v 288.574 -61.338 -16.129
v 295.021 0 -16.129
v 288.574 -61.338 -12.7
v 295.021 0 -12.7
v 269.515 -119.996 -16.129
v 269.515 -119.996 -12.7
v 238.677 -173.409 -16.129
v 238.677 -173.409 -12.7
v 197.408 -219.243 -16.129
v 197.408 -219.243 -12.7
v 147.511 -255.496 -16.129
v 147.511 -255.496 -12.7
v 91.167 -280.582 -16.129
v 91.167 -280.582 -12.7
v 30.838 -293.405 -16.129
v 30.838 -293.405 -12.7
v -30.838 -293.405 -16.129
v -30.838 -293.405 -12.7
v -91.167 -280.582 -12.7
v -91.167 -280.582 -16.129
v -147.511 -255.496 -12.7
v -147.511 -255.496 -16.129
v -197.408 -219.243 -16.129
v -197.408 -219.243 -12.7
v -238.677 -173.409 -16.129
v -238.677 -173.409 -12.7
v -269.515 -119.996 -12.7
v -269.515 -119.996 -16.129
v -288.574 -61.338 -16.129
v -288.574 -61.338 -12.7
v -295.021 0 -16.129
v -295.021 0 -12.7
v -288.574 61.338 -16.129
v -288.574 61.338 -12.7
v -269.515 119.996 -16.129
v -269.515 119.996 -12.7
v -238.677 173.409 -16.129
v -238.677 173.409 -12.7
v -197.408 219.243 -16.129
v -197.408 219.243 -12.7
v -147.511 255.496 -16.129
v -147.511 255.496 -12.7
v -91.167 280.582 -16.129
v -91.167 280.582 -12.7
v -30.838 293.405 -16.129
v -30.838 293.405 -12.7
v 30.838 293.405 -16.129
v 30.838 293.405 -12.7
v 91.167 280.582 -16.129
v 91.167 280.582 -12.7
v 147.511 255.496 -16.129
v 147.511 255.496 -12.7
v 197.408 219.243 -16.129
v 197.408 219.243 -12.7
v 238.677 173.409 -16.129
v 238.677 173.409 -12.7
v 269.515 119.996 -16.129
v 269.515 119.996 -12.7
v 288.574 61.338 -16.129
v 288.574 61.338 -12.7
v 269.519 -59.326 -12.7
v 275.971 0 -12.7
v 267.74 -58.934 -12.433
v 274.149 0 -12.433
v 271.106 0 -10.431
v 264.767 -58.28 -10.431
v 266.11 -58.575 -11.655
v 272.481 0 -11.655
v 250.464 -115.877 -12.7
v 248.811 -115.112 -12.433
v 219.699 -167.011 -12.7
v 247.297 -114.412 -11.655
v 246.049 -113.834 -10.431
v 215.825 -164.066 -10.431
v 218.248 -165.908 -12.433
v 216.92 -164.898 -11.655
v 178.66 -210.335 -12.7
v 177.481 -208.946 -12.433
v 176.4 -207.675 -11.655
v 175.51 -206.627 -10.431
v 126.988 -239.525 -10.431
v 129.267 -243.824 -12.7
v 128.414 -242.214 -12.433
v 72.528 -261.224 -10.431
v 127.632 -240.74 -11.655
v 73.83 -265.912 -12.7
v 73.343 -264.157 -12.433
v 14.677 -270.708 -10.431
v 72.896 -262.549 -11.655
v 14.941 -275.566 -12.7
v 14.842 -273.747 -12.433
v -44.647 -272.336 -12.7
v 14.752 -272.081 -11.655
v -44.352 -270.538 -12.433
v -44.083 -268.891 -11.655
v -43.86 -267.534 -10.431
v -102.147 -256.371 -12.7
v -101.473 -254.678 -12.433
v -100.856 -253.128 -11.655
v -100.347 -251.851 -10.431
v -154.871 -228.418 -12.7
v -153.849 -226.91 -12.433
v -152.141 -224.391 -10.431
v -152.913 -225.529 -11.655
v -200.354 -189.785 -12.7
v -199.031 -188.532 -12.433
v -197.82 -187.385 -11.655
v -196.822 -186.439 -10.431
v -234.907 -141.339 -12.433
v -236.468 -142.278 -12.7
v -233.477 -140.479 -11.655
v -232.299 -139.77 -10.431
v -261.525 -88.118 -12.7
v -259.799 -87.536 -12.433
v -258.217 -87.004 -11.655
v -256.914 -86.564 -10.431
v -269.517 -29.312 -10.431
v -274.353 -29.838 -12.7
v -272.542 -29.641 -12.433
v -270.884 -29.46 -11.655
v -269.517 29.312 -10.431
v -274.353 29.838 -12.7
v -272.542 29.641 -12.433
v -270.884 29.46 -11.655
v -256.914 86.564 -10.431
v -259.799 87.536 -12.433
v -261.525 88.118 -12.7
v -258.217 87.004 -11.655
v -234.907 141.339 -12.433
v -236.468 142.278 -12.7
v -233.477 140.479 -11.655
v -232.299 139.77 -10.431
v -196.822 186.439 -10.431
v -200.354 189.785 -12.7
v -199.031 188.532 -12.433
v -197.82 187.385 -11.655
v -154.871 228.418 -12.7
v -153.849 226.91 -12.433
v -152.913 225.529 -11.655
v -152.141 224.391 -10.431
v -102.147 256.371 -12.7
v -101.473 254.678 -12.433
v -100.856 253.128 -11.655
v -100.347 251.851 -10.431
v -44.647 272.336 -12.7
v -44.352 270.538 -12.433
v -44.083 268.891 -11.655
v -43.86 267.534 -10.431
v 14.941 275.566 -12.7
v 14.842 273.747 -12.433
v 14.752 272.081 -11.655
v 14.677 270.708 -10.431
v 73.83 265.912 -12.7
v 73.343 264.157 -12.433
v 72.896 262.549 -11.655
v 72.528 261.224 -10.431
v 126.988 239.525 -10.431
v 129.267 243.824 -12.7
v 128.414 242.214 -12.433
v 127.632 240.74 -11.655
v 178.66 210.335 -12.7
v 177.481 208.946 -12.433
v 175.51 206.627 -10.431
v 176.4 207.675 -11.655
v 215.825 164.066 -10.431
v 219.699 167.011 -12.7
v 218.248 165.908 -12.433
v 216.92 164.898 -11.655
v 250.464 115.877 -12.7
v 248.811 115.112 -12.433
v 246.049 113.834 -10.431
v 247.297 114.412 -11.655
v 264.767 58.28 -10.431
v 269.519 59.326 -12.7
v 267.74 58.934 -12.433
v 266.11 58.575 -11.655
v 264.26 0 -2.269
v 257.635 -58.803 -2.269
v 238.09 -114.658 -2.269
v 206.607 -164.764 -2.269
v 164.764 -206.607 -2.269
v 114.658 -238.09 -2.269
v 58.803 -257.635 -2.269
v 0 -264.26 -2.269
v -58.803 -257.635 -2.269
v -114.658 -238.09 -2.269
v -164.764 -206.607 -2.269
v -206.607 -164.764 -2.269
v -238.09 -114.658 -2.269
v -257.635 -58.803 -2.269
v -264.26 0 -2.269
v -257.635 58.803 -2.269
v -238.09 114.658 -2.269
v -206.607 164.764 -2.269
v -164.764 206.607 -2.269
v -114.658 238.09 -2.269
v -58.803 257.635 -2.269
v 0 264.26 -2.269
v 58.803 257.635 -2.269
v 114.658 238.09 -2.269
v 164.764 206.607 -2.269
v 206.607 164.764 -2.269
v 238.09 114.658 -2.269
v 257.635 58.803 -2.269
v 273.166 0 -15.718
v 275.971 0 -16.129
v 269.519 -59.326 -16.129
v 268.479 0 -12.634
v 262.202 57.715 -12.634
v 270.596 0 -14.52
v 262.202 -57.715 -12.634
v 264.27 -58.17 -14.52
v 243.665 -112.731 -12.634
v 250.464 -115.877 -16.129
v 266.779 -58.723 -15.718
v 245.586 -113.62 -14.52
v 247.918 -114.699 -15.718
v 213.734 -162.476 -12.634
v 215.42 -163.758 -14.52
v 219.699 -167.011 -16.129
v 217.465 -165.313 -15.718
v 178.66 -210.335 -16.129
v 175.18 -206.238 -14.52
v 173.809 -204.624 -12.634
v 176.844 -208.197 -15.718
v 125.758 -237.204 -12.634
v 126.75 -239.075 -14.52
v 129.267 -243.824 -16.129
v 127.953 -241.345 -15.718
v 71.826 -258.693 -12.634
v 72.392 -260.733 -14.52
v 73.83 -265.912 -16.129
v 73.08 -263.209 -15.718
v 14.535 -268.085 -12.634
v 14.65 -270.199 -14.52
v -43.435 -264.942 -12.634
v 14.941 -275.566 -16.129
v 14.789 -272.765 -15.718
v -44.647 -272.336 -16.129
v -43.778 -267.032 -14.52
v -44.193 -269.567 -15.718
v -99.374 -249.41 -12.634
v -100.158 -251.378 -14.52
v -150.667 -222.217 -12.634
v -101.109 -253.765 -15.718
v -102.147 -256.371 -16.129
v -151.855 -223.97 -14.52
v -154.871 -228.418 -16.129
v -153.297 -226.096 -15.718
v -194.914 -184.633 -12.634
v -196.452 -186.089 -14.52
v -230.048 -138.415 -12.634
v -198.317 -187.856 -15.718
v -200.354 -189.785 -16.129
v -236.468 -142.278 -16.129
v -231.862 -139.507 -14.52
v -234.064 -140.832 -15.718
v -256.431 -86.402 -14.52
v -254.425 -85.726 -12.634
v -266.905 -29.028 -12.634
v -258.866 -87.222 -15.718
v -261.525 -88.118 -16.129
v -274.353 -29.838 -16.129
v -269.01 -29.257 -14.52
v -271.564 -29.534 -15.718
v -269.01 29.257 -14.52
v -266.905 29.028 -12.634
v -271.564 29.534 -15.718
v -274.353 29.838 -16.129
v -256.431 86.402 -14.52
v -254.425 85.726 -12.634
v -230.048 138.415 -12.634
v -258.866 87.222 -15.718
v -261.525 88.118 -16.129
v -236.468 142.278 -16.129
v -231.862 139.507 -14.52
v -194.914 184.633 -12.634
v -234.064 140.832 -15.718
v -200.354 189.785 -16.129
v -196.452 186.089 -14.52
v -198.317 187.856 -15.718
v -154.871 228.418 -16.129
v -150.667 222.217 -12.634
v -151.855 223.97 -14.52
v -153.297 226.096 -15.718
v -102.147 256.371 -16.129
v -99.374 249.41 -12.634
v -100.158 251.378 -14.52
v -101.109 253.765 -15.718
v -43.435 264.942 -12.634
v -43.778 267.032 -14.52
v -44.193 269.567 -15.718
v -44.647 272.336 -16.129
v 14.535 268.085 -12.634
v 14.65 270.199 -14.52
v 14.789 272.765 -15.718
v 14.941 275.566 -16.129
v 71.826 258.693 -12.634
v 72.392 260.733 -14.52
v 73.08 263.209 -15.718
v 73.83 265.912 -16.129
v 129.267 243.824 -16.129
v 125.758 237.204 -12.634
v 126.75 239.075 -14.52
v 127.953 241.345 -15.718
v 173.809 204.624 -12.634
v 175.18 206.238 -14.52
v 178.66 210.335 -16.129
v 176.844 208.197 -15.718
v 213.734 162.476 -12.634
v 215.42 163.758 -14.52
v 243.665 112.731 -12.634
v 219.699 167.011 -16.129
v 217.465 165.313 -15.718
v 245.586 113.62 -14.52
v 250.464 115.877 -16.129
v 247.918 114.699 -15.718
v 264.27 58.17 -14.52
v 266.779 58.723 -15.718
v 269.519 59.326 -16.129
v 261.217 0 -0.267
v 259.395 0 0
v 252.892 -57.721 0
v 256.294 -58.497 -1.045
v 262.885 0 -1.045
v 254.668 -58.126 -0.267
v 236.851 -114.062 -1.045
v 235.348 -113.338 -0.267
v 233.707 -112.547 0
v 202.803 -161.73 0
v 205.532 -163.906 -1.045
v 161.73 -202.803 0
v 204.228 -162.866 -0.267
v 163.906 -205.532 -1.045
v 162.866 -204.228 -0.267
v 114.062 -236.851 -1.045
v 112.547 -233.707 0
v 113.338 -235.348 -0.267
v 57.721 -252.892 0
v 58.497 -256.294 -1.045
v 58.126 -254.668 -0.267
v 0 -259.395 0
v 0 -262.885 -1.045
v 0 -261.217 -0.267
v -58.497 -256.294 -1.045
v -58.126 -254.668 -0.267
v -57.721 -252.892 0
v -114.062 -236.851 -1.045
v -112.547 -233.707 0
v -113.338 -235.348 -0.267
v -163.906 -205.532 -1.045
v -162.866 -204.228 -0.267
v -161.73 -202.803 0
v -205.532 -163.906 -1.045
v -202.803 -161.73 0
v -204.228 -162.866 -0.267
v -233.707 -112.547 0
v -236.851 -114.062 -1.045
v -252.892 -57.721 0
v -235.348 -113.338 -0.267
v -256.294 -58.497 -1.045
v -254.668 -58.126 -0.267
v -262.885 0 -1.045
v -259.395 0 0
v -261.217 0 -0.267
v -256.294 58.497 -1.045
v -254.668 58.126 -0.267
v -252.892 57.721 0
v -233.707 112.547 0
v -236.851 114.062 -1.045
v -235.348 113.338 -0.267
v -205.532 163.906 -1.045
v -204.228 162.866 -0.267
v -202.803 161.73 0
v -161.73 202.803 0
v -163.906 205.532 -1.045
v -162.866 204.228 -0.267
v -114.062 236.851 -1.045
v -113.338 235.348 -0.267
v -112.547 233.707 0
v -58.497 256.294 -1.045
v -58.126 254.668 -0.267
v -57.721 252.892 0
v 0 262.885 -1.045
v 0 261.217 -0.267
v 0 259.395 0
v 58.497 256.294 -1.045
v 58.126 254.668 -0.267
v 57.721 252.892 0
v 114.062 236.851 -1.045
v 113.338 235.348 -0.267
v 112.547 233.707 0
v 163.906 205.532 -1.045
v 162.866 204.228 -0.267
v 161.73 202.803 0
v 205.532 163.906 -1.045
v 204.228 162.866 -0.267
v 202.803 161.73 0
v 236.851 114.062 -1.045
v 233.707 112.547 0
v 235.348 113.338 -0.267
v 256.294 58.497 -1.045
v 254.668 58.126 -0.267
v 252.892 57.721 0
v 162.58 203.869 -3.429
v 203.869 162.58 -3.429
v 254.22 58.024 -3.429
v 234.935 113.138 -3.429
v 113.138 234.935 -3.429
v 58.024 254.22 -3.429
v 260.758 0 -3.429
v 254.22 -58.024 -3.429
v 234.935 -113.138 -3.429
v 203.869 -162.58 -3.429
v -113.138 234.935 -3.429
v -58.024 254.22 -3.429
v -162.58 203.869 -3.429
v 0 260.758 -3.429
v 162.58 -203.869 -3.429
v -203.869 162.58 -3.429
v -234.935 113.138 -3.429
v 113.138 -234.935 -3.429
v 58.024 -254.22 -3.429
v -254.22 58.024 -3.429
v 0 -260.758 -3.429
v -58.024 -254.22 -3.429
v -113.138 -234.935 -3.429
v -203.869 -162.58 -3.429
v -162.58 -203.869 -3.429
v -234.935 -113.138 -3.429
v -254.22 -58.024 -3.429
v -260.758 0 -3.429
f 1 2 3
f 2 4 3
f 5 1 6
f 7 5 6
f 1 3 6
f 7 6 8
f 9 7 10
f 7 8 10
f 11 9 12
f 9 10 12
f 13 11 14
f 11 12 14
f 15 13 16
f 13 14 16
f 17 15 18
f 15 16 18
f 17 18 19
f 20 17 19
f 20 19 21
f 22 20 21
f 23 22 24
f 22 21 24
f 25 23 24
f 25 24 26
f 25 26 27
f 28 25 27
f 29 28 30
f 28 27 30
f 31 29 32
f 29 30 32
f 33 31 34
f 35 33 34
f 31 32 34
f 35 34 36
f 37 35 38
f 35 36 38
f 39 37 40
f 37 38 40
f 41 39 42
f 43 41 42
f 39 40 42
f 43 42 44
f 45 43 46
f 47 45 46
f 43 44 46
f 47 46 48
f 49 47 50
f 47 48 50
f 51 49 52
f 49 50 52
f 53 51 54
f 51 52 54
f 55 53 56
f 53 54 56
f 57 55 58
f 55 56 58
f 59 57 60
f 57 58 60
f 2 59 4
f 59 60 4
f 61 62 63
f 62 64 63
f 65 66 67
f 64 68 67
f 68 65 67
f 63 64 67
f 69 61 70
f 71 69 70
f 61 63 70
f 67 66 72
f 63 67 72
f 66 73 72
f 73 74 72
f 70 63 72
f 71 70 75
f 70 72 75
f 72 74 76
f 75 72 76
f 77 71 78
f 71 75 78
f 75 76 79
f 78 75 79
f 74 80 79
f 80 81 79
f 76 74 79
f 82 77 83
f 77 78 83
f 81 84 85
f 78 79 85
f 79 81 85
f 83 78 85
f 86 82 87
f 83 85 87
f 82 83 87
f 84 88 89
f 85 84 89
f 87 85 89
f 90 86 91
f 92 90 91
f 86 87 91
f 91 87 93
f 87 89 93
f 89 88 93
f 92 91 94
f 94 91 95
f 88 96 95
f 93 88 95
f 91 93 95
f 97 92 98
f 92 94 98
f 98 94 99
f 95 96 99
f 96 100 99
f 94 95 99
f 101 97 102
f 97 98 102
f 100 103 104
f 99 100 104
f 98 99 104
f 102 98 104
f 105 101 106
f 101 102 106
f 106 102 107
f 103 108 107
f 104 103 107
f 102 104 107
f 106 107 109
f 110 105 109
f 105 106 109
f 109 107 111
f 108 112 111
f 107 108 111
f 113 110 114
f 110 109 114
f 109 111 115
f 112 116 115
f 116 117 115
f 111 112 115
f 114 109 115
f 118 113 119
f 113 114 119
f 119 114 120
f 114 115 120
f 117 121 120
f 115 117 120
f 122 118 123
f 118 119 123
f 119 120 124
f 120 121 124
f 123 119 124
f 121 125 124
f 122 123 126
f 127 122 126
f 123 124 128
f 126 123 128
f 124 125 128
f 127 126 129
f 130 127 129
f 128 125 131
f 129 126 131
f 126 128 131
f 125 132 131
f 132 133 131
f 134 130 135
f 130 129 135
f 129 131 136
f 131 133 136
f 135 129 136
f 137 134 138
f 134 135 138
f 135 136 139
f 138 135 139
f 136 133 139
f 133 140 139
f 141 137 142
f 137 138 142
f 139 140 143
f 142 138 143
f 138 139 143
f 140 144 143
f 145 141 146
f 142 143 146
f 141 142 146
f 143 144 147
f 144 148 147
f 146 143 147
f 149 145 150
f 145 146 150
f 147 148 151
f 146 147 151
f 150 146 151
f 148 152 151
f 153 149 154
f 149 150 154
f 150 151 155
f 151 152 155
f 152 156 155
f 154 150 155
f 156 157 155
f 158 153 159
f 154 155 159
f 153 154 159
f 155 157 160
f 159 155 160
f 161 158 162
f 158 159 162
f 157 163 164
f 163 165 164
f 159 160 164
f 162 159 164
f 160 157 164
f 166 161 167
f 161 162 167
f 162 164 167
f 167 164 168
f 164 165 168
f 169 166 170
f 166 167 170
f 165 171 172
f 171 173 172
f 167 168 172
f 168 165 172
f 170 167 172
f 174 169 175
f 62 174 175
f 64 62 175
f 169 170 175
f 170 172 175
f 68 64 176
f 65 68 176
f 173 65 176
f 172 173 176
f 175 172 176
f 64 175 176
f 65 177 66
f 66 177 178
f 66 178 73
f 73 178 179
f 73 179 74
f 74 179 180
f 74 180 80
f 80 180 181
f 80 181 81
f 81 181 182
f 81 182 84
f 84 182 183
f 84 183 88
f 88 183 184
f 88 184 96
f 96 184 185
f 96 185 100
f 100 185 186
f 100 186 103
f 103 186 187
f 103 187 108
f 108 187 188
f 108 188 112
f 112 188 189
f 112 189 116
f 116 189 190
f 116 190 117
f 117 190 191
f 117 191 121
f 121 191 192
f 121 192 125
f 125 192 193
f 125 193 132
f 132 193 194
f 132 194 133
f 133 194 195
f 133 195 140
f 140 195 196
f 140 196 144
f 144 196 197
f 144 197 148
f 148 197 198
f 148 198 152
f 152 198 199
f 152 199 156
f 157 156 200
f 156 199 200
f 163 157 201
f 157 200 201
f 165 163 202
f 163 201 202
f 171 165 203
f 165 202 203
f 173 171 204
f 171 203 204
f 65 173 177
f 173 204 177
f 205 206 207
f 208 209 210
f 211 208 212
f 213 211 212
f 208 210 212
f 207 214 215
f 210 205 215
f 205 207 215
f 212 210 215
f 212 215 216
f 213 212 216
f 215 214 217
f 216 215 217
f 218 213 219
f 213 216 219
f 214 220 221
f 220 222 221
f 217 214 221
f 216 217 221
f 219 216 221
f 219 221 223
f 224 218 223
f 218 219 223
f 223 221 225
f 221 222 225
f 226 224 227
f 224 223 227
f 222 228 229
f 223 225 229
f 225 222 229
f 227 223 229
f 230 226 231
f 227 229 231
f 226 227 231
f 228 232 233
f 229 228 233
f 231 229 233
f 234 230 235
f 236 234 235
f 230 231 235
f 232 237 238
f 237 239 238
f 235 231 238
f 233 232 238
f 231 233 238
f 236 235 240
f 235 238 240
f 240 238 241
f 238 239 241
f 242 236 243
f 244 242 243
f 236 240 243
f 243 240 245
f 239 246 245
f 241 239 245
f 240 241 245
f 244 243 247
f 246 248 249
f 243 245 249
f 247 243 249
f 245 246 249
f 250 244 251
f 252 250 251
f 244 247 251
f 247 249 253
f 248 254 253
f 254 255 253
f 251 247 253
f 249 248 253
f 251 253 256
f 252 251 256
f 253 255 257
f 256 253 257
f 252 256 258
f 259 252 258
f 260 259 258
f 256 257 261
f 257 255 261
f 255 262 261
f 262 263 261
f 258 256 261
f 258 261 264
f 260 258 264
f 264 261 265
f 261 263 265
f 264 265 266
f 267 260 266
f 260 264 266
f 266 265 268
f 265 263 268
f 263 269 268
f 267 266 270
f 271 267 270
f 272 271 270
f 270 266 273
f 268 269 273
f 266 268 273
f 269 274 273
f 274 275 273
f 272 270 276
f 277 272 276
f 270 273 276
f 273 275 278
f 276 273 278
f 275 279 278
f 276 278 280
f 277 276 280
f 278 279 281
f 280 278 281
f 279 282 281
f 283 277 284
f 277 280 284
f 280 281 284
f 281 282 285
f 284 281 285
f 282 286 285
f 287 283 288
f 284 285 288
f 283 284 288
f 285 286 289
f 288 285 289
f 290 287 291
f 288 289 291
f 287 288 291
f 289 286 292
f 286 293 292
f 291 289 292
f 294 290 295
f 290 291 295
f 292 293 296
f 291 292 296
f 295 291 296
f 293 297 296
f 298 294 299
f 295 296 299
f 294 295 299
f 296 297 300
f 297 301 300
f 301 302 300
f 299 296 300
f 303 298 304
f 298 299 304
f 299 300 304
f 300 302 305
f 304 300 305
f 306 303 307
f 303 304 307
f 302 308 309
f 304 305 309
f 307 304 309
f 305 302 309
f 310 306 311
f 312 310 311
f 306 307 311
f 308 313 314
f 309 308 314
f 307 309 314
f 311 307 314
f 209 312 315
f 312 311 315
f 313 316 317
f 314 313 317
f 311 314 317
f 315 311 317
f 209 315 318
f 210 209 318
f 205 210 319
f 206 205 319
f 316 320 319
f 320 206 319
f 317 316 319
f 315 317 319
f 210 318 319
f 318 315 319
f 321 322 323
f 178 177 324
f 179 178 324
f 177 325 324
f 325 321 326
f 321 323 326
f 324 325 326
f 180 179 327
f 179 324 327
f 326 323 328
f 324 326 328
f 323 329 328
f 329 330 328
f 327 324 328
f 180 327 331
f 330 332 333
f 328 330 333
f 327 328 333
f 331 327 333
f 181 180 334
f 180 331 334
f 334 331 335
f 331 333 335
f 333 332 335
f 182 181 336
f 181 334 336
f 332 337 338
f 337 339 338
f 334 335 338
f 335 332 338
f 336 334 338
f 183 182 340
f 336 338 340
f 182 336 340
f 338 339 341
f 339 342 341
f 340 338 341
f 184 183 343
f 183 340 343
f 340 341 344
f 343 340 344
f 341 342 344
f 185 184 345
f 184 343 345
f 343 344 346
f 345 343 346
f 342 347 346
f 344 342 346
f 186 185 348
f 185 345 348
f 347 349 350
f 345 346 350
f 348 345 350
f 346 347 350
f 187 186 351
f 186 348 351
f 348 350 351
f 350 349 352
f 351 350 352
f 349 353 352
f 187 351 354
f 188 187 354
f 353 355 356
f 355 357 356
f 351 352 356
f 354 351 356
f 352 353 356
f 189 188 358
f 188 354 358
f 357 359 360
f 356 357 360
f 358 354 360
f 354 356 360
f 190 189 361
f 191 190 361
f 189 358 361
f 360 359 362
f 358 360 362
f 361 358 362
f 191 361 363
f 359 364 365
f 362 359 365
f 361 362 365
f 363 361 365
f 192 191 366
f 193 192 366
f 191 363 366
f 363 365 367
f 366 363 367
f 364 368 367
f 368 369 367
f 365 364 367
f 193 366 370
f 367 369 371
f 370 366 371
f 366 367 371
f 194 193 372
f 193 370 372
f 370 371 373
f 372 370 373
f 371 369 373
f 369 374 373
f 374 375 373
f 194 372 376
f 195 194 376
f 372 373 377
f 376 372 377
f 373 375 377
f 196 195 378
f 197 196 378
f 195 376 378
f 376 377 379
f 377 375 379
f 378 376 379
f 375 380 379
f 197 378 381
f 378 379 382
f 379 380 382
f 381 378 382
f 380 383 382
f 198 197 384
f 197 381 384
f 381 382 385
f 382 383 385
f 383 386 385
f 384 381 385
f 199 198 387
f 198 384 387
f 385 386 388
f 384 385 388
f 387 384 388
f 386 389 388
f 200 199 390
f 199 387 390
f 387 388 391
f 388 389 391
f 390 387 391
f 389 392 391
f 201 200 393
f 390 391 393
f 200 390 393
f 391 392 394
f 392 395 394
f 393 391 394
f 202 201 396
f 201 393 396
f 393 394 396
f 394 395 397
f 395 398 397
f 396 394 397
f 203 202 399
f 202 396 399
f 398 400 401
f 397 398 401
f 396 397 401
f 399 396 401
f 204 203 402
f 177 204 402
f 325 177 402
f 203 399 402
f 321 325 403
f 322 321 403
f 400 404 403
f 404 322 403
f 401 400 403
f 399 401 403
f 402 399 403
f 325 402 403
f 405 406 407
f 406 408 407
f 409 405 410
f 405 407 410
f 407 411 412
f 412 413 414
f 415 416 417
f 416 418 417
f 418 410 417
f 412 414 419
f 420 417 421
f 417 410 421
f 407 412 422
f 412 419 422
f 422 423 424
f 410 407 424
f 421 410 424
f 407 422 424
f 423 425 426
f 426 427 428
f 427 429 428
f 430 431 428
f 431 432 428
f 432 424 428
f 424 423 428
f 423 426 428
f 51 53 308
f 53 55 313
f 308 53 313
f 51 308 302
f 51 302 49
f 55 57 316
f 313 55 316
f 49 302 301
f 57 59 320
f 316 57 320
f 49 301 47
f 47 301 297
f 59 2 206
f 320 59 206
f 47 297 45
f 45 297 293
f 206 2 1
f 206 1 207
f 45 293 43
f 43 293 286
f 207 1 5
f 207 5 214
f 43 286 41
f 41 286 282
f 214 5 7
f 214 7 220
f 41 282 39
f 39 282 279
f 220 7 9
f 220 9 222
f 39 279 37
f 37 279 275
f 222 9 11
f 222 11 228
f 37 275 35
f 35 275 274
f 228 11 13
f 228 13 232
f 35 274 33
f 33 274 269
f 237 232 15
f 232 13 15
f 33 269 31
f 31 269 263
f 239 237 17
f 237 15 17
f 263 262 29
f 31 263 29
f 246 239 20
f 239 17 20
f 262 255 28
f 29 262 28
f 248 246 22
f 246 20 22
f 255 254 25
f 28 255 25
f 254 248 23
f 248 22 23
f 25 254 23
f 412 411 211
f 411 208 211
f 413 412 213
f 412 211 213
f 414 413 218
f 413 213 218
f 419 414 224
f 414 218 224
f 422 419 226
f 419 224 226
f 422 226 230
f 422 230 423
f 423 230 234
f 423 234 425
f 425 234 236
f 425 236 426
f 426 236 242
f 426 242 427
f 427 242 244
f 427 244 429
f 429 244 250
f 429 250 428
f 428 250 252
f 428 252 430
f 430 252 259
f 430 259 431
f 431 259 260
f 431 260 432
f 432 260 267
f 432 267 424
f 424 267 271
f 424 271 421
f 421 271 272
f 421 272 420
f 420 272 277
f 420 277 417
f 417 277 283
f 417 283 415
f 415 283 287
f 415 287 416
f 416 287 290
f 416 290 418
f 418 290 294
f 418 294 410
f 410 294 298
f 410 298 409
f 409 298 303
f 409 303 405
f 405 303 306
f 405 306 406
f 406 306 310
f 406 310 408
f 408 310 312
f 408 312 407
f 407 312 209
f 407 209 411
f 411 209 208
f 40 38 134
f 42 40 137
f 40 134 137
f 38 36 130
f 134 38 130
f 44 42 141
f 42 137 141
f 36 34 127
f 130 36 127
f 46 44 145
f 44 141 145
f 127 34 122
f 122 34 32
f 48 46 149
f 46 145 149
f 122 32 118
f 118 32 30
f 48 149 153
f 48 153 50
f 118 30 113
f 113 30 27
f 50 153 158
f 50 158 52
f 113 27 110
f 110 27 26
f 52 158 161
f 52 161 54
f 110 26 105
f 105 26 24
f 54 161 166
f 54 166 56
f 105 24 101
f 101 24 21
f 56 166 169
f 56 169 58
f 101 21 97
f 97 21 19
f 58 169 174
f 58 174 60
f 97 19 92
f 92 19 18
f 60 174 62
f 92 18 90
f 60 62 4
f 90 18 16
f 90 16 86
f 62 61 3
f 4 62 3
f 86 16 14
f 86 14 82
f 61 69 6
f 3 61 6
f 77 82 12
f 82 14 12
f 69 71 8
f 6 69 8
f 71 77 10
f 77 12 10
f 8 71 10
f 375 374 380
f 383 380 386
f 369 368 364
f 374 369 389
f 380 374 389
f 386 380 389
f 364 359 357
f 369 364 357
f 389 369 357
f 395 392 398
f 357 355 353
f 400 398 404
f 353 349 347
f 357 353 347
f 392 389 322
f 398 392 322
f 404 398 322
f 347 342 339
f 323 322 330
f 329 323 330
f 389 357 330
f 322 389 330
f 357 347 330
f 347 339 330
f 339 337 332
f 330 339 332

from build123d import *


with BuildPart() as f1:
    # F0 (on Front) → F1 (revolve)
    with BuildSketch(Plane.XZ):
        with BuildLine():
            Line((259.395182, 0), (0, 0))
            Line((0, 0), (0, -3.429))
            Line((0, -3.429), (260.757632, -3.429))
            Line((260.757632, -3.429), (268.478561, -12.634282))
            ThreePointArc((268.478561, -12.634282), (271.837306, -15.21236), (275.971, -16.129))
            Line((275.971, -16.129), (295.021, -16.129))
            Line((295.021, -16.129), (295.021, -12.7))
            Line((295.021, -12.7), (275.971, -12.7))
            ThreePointArc((275.971, -12.7), (273.286783, -12.104779), (271.10578, -10.430703))
            Line((271.10578, -10.430703), (264.260402, -2.269297))
            ThreePointArc((264.260402, -2.269297), (262.079399, -0.595221), (259.395182, 0))
        make_face()
    revolve(axis=Axis((0, 0, -1.7145), (0, 0, -1)))


solid = f1.part
